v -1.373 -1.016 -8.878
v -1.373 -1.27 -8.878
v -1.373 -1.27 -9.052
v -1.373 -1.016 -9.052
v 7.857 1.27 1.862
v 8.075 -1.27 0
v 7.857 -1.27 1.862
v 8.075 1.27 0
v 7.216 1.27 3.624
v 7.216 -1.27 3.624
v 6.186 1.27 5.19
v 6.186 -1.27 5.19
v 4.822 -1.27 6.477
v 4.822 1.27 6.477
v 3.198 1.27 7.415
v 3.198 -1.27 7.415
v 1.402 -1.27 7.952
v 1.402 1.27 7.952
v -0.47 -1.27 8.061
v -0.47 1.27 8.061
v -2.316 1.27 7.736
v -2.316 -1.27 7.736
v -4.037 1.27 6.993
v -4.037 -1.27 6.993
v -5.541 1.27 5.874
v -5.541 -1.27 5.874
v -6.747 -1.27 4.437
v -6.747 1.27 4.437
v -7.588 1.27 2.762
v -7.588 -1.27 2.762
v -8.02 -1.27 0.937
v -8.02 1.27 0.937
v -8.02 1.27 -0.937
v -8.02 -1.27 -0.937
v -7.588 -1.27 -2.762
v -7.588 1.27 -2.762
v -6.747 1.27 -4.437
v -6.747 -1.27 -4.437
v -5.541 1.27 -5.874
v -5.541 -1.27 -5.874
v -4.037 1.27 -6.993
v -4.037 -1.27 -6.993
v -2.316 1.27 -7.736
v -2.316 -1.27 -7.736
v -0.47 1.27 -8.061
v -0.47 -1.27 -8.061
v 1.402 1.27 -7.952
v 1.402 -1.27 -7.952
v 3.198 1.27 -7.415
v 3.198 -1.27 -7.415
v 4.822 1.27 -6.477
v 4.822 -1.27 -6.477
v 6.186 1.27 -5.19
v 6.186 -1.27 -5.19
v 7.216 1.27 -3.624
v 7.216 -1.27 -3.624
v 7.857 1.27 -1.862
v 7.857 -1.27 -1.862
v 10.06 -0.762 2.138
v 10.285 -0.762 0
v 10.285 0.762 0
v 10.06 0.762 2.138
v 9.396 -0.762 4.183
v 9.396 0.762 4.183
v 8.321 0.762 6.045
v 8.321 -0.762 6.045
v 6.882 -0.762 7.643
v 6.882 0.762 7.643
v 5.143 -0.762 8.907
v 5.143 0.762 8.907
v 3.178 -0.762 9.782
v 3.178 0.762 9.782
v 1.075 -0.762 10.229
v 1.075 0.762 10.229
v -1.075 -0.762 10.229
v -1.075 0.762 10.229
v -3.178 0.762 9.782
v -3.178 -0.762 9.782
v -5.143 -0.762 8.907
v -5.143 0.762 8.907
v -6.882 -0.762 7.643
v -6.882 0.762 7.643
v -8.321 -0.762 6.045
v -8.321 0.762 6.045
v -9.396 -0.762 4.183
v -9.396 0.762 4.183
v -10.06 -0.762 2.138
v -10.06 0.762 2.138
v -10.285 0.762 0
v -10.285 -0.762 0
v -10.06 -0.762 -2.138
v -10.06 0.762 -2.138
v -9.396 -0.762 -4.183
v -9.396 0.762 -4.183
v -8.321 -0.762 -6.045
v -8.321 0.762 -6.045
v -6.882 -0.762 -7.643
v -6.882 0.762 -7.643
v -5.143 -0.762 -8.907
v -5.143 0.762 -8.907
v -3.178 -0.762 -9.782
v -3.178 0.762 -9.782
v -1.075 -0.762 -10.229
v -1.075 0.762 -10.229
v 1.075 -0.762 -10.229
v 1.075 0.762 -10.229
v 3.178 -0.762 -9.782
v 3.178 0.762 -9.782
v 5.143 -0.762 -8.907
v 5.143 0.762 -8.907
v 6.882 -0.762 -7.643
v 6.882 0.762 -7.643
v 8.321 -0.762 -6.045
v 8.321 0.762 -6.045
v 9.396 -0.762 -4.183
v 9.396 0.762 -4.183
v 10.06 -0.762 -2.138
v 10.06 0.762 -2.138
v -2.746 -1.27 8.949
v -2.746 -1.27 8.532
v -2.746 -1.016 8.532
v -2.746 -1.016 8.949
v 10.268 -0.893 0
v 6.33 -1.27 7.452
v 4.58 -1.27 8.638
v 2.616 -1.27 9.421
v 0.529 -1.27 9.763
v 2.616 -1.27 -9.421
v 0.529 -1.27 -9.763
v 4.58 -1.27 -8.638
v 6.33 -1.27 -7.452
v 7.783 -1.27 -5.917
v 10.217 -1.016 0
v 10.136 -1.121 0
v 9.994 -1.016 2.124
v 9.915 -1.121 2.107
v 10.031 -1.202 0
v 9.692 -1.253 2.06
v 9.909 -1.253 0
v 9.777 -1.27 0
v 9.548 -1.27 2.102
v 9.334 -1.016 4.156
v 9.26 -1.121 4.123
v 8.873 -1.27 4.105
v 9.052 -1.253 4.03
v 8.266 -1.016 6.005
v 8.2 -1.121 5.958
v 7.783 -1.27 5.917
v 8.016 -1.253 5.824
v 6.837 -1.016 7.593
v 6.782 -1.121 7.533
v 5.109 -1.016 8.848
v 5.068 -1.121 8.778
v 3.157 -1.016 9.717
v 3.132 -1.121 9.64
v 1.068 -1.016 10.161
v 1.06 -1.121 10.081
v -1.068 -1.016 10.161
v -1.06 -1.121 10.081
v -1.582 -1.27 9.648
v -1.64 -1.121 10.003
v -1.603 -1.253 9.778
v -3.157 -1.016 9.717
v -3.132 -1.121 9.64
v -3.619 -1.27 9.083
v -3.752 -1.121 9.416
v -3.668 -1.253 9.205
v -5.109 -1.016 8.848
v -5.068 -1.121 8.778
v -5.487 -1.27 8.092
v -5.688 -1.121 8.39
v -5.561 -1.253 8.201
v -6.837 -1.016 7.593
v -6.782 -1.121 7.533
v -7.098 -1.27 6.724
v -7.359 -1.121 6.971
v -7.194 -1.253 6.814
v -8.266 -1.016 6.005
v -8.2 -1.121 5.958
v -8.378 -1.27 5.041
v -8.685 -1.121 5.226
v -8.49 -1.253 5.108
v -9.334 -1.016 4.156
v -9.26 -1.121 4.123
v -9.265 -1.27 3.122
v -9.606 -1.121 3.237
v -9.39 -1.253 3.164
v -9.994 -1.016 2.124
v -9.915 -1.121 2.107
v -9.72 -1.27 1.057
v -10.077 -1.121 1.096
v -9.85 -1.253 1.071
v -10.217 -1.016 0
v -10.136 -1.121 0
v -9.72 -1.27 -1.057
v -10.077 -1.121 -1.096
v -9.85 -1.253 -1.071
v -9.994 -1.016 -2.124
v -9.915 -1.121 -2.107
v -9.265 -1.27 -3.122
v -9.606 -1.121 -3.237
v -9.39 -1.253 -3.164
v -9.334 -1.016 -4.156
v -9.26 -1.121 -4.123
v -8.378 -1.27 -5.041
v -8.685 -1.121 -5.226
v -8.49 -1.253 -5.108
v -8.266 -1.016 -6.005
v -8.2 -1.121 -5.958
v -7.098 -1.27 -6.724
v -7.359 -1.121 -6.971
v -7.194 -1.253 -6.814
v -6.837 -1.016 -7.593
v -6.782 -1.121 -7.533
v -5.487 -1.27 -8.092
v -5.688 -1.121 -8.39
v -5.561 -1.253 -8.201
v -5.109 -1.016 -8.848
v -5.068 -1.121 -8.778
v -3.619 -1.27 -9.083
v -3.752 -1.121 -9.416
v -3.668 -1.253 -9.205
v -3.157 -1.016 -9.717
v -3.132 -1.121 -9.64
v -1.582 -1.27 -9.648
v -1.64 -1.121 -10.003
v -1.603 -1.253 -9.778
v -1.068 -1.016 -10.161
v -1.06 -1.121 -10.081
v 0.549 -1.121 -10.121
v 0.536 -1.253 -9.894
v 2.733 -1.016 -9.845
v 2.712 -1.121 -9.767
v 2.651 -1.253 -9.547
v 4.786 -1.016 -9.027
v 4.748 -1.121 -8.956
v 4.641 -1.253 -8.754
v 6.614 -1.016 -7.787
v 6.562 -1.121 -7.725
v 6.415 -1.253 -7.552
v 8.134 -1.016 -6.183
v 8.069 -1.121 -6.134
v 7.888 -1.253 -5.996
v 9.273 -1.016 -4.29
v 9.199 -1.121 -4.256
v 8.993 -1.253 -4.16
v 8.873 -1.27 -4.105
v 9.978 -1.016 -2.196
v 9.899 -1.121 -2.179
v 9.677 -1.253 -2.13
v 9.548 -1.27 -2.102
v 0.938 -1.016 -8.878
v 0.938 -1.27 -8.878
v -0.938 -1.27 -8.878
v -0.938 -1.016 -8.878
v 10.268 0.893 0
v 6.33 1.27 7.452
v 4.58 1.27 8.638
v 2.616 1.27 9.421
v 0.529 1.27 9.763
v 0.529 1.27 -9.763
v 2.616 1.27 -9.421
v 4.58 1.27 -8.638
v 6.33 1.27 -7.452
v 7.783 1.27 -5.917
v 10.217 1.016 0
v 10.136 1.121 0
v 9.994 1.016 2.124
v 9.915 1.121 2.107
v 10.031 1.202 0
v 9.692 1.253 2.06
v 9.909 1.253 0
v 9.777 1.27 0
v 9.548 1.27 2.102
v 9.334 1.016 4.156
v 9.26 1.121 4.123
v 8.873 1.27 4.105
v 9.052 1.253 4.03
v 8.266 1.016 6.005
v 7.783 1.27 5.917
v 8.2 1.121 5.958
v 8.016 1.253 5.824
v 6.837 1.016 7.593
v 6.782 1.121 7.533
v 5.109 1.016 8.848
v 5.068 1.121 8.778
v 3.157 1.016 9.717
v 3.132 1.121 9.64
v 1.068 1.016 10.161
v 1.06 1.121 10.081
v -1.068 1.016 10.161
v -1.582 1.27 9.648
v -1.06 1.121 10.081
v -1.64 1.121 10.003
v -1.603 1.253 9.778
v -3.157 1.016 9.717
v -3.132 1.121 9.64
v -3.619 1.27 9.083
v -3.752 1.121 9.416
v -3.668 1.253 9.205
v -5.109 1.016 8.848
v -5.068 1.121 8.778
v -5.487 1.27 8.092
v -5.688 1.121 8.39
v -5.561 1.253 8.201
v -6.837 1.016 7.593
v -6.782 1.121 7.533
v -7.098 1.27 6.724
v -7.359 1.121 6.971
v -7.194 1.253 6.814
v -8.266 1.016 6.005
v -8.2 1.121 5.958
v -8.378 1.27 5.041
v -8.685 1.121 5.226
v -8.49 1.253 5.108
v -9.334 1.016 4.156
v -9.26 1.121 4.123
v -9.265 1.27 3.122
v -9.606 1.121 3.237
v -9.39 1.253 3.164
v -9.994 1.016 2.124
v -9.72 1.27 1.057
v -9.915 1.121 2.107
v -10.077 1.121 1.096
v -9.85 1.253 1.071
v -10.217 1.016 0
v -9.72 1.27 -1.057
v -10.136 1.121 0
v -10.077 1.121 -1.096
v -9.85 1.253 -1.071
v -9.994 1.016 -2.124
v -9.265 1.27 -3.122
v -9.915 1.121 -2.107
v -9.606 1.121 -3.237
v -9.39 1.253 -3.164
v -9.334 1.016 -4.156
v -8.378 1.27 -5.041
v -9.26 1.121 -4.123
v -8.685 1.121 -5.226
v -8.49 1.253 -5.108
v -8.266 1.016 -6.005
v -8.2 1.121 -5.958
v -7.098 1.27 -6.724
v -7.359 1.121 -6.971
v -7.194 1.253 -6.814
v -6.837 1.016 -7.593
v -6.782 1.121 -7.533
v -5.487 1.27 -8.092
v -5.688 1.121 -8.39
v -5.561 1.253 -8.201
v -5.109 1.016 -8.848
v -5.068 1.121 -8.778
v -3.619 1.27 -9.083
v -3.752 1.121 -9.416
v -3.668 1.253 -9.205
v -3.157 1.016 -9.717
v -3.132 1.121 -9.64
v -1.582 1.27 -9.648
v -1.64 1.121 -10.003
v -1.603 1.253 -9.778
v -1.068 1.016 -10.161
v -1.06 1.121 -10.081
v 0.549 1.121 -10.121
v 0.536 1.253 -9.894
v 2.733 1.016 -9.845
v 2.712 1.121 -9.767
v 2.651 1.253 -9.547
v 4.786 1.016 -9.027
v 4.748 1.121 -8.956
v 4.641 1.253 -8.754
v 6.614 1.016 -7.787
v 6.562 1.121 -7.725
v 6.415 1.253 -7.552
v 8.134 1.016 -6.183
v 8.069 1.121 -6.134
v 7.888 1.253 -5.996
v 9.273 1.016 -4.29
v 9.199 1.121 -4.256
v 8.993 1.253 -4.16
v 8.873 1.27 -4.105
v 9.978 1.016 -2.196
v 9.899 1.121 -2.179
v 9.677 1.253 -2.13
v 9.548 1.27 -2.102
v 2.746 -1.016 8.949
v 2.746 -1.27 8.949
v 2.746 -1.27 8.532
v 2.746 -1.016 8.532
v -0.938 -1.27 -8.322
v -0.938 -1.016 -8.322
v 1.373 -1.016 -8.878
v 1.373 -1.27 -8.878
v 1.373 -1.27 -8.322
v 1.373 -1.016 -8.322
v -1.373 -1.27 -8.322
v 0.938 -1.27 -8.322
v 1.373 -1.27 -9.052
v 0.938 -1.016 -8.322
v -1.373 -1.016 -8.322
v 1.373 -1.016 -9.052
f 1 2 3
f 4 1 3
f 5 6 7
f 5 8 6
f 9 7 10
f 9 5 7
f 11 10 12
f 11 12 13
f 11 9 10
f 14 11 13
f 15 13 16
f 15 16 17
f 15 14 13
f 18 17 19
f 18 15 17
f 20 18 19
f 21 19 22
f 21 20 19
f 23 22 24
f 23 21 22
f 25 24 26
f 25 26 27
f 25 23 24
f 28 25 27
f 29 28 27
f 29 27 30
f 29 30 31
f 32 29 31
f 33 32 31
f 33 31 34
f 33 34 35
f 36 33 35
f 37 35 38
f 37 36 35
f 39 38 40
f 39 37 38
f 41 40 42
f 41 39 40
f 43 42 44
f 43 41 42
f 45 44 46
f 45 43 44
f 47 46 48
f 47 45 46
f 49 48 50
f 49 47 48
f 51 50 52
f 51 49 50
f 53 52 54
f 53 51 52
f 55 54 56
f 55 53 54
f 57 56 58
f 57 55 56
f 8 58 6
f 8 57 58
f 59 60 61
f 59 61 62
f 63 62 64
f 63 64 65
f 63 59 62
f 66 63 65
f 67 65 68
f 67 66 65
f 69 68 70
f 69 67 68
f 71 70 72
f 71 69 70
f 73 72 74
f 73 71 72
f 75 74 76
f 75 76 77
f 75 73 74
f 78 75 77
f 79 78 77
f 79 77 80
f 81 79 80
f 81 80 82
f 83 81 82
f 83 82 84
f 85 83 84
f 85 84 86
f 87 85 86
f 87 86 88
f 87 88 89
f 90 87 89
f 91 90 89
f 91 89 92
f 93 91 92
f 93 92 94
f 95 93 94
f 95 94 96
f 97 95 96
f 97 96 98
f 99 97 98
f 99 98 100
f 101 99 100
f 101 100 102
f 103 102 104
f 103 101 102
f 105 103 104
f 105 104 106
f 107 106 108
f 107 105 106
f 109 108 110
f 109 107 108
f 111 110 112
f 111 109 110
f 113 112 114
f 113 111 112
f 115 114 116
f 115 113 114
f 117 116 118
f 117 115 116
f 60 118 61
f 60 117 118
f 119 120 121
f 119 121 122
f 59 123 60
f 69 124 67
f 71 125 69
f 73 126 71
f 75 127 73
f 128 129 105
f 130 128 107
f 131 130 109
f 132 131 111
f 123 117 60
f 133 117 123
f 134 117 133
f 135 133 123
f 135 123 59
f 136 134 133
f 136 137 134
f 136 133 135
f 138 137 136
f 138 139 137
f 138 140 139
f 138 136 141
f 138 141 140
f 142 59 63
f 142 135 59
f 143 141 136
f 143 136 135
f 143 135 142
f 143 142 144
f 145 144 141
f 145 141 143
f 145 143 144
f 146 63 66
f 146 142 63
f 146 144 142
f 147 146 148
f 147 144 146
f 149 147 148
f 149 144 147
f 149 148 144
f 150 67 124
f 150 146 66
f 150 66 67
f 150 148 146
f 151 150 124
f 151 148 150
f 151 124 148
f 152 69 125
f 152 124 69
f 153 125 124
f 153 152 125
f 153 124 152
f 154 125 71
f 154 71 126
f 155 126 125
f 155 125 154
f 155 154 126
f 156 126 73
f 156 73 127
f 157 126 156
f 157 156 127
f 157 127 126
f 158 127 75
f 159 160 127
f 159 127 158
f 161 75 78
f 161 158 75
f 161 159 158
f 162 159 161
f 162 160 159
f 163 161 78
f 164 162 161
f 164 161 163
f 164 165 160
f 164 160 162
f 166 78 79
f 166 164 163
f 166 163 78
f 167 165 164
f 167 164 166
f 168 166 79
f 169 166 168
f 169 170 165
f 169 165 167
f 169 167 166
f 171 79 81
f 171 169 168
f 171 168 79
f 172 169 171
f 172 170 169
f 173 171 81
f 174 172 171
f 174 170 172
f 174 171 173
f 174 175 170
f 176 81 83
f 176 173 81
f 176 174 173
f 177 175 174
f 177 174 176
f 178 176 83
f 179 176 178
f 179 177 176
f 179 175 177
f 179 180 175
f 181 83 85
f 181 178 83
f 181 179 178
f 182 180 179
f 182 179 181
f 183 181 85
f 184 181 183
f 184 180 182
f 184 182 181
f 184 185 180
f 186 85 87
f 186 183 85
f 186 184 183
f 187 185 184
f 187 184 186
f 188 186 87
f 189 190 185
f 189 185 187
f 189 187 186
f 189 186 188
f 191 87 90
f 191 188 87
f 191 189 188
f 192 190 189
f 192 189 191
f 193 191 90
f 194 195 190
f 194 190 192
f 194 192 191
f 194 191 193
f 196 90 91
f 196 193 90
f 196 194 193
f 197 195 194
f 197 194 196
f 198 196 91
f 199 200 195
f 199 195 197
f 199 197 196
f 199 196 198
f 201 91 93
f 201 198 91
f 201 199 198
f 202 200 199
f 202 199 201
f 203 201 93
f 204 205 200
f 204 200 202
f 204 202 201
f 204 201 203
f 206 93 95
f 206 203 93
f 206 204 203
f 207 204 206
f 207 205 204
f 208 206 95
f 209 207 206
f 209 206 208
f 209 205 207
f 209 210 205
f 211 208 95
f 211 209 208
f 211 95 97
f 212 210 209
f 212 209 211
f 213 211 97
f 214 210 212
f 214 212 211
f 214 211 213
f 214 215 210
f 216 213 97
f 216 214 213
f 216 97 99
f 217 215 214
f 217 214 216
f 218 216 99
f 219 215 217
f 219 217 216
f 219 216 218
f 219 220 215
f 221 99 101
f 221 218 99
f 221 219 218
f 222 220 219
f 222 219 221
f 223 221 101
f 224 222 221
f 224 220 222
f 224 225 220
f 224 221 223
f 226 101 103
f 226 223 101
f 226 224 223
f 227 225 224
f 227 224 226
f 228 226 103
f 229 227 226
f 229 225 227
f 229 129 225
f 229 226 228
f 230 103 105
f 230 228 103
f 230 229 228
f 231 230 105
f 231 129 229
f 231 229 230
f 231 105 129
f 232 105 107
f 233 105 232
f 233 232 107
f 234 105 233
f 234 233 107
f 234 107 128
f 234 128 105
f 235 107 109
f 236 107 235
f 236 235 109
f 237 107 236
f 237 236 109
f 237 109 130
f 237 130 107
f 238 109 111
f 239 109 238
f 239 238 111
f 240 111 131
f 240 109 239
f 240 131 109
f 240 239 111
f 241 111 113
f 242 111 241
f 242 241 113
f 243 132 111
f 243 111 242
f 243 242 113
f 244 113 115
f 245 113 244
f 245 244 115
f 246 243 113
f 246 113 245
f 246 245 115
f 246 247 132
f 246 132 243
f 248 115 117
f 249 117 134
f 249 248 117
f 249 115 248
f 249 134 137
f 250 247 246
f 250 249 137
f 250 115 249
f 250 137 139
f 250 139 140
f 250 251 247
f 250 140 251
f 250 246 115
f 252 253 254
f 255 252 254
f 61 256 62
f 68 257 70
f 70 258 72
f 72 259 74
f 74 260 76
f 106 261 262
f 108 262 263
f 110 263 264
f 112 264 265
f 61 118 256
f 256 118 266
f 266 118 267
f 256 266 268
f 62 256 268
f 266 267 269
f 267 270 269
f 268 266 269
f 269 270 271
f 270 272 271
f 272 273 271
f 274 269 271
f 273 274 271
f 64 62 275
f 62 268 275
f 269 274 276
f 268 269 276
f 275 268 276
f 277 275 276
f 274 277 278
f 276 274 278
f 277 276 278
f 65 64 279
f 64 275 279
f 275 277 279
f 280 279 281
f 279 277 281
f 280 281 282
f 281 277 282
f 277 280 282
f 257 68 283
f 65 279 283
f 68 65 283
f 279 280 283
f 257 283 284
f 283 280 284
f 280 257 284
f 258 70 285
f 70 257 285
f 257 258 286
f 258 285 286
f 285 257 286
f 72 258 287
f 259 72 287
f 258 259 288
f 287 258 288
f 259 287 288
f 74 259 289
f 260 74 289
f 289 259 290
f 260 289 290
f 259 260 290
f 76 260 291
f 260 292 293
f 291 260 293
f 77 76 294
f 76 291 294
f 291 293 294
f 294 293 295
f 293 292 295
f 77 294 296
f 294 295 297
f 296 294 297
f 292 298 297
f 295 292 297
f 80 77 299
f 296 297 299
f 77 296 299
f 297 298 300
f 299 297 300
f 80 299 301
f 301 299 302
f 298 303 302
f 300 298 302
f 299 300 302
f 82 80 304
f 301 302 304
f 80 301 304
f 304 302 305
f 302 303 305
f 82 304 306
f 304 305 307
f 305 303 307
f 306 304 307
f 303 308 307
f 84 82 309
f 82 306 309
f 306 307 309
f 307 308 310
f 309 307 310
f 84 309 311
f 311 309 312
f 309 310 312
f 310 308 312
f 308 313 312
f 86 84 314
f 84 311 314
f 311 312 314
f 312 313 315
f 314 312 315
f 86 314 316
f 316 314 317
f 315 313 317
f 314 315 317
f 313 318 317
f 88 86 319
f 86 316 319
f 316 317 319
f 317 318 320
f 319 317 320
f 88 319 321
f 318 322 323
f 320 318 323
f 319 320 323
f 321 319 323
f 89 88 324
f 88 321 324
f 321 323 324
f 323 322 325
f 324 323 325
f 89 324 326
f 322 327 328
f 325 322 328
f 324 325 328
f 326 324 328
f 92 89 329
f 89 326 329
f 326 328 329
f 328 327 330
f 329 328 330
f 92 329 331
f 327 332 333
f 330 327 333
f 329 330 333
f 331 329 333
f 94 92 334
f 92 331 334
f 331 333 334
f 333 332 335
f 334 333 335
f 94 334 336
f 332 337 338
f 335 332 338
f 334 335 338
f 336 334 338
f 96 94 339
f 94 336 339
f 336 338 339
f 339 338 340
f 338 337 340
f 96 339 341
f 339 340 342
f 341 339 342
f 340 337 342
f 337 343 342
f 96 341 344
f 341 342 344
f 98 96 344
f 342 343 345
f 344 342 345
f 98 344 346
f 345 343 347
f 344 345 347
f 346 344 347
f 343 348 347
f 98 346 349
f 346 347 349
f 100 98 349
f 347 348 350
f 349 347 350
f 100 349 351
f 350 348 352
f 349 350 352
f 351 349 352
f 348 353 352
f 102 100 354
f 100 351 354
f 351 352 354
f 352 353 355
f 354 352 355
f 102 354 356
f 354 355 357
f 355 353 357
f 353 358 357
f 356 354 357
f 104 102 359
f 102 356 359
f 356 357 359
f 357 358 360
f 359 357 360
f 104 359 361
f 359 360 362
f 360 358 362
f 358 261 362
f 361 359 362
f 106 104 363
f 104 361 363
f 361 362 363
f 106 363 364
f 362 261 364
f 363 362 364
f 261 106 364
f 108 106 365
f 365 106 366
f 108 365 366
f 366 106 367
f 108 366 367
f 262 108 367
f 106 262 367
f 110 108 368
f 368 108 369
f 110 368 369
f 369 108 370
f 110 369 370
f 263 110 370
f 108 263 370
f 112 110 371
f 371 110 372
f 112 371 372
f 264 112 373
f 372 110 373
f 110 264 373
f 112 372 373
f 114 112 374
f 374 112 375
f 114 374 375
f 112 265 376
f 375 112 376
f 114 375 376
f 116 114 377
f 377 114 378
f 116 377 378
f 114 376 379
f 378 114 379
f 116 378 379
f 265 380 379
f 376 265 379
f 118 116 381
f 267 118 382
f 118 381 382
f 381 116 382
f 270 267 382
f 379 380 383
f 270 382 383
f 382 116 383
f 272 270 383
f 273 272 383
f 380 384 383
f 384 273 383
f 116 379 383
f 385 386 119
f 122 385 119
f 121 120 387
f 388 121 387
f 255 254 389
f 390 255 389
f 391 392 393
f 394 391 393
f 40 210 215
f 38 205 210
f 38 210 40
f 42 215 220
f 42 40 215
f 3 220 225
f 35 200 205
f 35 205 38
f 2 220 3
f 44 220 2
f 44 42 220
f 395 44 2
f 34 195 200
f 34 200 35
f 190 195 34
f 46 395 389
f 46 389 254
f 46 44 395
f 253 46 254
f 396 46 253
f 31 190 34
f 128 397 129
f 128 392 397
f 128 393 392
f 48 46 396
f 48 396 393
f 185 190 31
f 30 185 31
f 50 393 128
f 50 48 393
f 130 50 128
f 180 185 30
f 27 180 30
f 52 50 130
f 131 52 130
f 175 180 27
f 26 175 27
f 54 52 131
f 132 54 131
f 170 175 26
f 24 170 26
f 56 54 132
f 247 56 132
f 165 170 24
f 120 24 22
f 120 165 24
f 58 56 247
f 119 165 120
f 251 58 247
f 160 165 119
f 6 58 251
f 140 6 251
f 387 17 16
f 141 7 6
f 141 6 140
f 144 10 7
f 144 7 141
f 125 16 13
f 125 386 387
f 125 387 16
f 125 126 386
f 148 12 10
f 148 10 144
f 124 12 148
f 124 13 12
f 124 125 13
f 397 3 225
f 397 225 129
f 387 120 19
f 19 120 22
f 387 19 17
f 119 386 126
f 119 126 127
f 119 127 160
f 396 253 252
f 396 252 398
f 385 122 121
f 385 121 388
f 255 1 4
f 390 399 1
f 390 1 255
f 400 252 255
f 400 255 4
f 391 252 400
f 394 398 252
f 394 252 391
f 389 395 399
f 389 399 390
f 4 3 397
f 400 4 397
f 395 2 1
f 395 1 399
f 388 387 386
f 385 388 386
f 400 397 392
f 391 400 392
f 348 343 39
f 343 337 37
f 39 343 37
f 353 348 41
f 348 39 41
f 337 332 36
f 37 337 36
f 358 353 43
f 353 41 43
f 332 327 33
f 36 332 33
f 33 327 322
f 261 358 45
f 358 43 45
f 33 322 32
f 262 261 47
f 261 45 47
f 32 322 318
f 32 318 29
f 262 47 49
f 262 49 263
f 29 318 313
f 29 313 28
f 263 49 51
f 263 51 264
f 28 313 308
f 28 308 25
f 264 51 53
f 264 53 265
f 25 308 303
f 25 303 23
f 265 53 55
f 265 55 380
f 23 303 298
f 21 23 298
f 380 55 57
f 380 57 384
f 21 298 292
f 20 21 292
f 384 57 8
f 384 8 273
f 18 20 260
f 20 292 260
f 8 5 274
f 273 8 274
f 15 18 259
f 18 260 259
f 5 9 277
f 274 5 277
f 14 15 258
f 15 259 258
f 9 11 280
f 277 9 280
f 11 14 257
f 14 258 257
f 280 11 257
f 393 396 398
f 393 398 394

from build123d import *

# Parameters (mm, degrees)
F0_R     = 10.285065
F0_R_2   = 8.074945
F1_DEPTH = 1.27
F2_R     = 0.508
F3_R     = 0.508
F4_W     = 2.745567
F4_H     = 0.41702
F4_W_2   = 0.434395
F4_H_2   = 0.556026
F5_DEPTH = 0.254


with BuildPart() as f1:
    # F0 (on Front) → F1 (new body, symmetric)
    with BuildSketch(Plane.XZ):
        Circle(F0_R)
        Circle(F0_R_2, mode=Mode.SUBTRACT)
    extrude(amount=F1_DEPTH, both=True)

    # F2
    f2_edges = [f1.edges().sort_by_distance(p)[0] for p in [
        (-10.285065, 1.27, 0),
    ]]
    fillet(f2_edges, radius=F2_R)

    # F3
    f3_edges = [f1.edges().sort_by_distance(p)[0] for p in [
        (-10.285065, -1.27, 0),
    ]]
    fillet(f3_edges, radius=F3_R)

    # F4 (on face) → F5 (cut)
    with BuildSketch(Plane.XZ.offset(1.27)):
        with Locations((1.372783, 8.740652)):
            Rectangle(F4_W, F4_H)
        with Locations((-1.372783, 8.740652)):
            Rectangle(F4_W, F4_H)
        Polygon((0, -8.878413), (0, -9.05217), (1.372878, -9.05217), (1.372878, -8.878413), (0.938483, -8.878413), align=None)
        Polygon((-1.372878, -9.05217), (0, -9.05217), (0, -8.878413), (-0.938483, -8.878413), (-1.372878, -8.878413), align=None)
        with Locations((1.15568, -8.6004)):
            Rectangle(F4_W_2, F4_H_2)
        with Locations((-1.15568, -8.6004)):
            Rectangle(F4_W_2, F4_H_2)
    extrude(amount=-F5_DEPTH, mode=Mode.SUBTRACT)


solid = f1.part
